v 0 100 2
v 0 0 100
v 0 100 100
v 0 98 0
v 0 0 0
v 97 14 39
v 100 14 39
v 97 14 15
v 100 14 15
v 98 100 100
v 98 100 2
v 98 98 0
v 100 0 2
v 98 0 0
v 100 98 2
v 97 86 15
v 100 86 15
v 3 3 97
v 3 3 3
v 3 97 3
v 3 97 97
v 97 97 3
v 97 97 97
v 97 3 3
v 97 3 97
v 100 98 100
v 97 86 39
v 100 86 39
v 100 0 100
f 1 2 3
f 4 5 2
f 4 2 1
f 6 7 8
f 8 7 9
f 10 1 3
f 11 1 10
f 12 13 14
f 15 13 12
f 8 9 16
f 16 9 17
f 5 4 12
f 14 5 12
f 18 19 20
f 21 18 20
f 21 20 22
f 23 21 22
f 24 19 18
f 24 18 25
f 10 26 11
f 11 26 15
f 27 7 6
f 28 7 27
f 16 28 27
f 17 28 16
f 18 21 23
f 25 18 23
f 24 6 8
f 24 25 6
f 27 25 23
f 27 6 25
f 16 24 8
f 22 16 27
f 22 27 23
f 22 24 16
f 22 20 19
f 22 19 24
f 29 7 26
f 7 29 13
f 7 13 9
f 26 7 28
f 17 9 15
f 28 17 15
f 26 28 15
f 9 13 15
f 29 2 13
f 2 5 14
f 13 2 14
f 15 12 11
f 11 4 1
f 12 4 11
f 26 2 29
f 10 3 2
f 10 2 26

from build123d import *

# Parameters (mm, degrees)
ESQUISSE1_W             = 100
ESQUISSE1_H             = 100
BOSS_EXTRU_1_DEPTH      = 3
ESQUISSE2_W             = 100
ESQUISSE2_H             = 100
ESQUISSE2_W_2           = 94
ESQUISSE2_H_2           = 94
BOSS_EXTRU_2_DEPTH      = 94
ESQUISSE3_W             = 100
ESQUISSE3_H             = 100
BOSS_EXTRU_3_DEPTH      = 3
ESQUISSE4_W             = 24
ESQUISSE4_H             = 72
ENL_V_MAT_EXTRU_1_DEPTH = 3
CHANFREIN1_SIZE         = 2


with BuildPart() as part:
    # Esquisse1 → Boss.-Extru.1 (new body)
    with BuildSketch(Plane.XY):
        with Locations((50, 50)):
            Rectangle(ESQUISSE1_W, ESQUISSE1_H)
    extrude(amount=BOSS_EXTRU_1_DEPTH)

    # Esquisse2 → Boss.-Extru.2 (add)
    with BuildSketch(Plane.XY.offset(3)):
        with Locations((50, 50)):
            Rectangle(ESQUISSE2_W, ESQUISSE2_H)
        with Locations((50, 50)):
            Rectangle(ESQUISSE2_W_2, ESQUISSE2_H_2, mode=Mode.SUBTRACT)
    extrude(amount=BOSS_EXTRU_2_DEPTH)

    # Esquisse3 → Boss.-Extru.3 (add)
    with BuildSketch(Plane.XY.offset(97)):
        with Locations((50, 50)):
            Rectangle(ESQUISSE3_W, ESQUISSE3_H)
    extrude(amount=BOSS_EXTRU_3_DEPTH)

    # Esquisse4 → Enlèv. mat.-Extru.1 (cut)
    with BuildSketch(Plane(origin=(100, 0, 0), x_dir=(0, 0, -1), z_dir=(1, 0, 0))):
        with Locations((-27, 50)):
            Rectangle(ESQUISSE4_W, ESQUISSE4_H)
    extrude(amount=-ENL_V_MAT_EXTRU_1_DEPTH, mode=Mode.SUBTRACT)

    # Chanfrein1
    chanfrein1_edges = [part.edges().sort_by_distance(p)[0] for p in [
        (50, 100, 0),
        (100, 50, 0),
        (100, 100, 50),
    ]]
    chamfer(chanfrein1_edges, length=CHANFREIN1_SIZE)


solid = part.part
